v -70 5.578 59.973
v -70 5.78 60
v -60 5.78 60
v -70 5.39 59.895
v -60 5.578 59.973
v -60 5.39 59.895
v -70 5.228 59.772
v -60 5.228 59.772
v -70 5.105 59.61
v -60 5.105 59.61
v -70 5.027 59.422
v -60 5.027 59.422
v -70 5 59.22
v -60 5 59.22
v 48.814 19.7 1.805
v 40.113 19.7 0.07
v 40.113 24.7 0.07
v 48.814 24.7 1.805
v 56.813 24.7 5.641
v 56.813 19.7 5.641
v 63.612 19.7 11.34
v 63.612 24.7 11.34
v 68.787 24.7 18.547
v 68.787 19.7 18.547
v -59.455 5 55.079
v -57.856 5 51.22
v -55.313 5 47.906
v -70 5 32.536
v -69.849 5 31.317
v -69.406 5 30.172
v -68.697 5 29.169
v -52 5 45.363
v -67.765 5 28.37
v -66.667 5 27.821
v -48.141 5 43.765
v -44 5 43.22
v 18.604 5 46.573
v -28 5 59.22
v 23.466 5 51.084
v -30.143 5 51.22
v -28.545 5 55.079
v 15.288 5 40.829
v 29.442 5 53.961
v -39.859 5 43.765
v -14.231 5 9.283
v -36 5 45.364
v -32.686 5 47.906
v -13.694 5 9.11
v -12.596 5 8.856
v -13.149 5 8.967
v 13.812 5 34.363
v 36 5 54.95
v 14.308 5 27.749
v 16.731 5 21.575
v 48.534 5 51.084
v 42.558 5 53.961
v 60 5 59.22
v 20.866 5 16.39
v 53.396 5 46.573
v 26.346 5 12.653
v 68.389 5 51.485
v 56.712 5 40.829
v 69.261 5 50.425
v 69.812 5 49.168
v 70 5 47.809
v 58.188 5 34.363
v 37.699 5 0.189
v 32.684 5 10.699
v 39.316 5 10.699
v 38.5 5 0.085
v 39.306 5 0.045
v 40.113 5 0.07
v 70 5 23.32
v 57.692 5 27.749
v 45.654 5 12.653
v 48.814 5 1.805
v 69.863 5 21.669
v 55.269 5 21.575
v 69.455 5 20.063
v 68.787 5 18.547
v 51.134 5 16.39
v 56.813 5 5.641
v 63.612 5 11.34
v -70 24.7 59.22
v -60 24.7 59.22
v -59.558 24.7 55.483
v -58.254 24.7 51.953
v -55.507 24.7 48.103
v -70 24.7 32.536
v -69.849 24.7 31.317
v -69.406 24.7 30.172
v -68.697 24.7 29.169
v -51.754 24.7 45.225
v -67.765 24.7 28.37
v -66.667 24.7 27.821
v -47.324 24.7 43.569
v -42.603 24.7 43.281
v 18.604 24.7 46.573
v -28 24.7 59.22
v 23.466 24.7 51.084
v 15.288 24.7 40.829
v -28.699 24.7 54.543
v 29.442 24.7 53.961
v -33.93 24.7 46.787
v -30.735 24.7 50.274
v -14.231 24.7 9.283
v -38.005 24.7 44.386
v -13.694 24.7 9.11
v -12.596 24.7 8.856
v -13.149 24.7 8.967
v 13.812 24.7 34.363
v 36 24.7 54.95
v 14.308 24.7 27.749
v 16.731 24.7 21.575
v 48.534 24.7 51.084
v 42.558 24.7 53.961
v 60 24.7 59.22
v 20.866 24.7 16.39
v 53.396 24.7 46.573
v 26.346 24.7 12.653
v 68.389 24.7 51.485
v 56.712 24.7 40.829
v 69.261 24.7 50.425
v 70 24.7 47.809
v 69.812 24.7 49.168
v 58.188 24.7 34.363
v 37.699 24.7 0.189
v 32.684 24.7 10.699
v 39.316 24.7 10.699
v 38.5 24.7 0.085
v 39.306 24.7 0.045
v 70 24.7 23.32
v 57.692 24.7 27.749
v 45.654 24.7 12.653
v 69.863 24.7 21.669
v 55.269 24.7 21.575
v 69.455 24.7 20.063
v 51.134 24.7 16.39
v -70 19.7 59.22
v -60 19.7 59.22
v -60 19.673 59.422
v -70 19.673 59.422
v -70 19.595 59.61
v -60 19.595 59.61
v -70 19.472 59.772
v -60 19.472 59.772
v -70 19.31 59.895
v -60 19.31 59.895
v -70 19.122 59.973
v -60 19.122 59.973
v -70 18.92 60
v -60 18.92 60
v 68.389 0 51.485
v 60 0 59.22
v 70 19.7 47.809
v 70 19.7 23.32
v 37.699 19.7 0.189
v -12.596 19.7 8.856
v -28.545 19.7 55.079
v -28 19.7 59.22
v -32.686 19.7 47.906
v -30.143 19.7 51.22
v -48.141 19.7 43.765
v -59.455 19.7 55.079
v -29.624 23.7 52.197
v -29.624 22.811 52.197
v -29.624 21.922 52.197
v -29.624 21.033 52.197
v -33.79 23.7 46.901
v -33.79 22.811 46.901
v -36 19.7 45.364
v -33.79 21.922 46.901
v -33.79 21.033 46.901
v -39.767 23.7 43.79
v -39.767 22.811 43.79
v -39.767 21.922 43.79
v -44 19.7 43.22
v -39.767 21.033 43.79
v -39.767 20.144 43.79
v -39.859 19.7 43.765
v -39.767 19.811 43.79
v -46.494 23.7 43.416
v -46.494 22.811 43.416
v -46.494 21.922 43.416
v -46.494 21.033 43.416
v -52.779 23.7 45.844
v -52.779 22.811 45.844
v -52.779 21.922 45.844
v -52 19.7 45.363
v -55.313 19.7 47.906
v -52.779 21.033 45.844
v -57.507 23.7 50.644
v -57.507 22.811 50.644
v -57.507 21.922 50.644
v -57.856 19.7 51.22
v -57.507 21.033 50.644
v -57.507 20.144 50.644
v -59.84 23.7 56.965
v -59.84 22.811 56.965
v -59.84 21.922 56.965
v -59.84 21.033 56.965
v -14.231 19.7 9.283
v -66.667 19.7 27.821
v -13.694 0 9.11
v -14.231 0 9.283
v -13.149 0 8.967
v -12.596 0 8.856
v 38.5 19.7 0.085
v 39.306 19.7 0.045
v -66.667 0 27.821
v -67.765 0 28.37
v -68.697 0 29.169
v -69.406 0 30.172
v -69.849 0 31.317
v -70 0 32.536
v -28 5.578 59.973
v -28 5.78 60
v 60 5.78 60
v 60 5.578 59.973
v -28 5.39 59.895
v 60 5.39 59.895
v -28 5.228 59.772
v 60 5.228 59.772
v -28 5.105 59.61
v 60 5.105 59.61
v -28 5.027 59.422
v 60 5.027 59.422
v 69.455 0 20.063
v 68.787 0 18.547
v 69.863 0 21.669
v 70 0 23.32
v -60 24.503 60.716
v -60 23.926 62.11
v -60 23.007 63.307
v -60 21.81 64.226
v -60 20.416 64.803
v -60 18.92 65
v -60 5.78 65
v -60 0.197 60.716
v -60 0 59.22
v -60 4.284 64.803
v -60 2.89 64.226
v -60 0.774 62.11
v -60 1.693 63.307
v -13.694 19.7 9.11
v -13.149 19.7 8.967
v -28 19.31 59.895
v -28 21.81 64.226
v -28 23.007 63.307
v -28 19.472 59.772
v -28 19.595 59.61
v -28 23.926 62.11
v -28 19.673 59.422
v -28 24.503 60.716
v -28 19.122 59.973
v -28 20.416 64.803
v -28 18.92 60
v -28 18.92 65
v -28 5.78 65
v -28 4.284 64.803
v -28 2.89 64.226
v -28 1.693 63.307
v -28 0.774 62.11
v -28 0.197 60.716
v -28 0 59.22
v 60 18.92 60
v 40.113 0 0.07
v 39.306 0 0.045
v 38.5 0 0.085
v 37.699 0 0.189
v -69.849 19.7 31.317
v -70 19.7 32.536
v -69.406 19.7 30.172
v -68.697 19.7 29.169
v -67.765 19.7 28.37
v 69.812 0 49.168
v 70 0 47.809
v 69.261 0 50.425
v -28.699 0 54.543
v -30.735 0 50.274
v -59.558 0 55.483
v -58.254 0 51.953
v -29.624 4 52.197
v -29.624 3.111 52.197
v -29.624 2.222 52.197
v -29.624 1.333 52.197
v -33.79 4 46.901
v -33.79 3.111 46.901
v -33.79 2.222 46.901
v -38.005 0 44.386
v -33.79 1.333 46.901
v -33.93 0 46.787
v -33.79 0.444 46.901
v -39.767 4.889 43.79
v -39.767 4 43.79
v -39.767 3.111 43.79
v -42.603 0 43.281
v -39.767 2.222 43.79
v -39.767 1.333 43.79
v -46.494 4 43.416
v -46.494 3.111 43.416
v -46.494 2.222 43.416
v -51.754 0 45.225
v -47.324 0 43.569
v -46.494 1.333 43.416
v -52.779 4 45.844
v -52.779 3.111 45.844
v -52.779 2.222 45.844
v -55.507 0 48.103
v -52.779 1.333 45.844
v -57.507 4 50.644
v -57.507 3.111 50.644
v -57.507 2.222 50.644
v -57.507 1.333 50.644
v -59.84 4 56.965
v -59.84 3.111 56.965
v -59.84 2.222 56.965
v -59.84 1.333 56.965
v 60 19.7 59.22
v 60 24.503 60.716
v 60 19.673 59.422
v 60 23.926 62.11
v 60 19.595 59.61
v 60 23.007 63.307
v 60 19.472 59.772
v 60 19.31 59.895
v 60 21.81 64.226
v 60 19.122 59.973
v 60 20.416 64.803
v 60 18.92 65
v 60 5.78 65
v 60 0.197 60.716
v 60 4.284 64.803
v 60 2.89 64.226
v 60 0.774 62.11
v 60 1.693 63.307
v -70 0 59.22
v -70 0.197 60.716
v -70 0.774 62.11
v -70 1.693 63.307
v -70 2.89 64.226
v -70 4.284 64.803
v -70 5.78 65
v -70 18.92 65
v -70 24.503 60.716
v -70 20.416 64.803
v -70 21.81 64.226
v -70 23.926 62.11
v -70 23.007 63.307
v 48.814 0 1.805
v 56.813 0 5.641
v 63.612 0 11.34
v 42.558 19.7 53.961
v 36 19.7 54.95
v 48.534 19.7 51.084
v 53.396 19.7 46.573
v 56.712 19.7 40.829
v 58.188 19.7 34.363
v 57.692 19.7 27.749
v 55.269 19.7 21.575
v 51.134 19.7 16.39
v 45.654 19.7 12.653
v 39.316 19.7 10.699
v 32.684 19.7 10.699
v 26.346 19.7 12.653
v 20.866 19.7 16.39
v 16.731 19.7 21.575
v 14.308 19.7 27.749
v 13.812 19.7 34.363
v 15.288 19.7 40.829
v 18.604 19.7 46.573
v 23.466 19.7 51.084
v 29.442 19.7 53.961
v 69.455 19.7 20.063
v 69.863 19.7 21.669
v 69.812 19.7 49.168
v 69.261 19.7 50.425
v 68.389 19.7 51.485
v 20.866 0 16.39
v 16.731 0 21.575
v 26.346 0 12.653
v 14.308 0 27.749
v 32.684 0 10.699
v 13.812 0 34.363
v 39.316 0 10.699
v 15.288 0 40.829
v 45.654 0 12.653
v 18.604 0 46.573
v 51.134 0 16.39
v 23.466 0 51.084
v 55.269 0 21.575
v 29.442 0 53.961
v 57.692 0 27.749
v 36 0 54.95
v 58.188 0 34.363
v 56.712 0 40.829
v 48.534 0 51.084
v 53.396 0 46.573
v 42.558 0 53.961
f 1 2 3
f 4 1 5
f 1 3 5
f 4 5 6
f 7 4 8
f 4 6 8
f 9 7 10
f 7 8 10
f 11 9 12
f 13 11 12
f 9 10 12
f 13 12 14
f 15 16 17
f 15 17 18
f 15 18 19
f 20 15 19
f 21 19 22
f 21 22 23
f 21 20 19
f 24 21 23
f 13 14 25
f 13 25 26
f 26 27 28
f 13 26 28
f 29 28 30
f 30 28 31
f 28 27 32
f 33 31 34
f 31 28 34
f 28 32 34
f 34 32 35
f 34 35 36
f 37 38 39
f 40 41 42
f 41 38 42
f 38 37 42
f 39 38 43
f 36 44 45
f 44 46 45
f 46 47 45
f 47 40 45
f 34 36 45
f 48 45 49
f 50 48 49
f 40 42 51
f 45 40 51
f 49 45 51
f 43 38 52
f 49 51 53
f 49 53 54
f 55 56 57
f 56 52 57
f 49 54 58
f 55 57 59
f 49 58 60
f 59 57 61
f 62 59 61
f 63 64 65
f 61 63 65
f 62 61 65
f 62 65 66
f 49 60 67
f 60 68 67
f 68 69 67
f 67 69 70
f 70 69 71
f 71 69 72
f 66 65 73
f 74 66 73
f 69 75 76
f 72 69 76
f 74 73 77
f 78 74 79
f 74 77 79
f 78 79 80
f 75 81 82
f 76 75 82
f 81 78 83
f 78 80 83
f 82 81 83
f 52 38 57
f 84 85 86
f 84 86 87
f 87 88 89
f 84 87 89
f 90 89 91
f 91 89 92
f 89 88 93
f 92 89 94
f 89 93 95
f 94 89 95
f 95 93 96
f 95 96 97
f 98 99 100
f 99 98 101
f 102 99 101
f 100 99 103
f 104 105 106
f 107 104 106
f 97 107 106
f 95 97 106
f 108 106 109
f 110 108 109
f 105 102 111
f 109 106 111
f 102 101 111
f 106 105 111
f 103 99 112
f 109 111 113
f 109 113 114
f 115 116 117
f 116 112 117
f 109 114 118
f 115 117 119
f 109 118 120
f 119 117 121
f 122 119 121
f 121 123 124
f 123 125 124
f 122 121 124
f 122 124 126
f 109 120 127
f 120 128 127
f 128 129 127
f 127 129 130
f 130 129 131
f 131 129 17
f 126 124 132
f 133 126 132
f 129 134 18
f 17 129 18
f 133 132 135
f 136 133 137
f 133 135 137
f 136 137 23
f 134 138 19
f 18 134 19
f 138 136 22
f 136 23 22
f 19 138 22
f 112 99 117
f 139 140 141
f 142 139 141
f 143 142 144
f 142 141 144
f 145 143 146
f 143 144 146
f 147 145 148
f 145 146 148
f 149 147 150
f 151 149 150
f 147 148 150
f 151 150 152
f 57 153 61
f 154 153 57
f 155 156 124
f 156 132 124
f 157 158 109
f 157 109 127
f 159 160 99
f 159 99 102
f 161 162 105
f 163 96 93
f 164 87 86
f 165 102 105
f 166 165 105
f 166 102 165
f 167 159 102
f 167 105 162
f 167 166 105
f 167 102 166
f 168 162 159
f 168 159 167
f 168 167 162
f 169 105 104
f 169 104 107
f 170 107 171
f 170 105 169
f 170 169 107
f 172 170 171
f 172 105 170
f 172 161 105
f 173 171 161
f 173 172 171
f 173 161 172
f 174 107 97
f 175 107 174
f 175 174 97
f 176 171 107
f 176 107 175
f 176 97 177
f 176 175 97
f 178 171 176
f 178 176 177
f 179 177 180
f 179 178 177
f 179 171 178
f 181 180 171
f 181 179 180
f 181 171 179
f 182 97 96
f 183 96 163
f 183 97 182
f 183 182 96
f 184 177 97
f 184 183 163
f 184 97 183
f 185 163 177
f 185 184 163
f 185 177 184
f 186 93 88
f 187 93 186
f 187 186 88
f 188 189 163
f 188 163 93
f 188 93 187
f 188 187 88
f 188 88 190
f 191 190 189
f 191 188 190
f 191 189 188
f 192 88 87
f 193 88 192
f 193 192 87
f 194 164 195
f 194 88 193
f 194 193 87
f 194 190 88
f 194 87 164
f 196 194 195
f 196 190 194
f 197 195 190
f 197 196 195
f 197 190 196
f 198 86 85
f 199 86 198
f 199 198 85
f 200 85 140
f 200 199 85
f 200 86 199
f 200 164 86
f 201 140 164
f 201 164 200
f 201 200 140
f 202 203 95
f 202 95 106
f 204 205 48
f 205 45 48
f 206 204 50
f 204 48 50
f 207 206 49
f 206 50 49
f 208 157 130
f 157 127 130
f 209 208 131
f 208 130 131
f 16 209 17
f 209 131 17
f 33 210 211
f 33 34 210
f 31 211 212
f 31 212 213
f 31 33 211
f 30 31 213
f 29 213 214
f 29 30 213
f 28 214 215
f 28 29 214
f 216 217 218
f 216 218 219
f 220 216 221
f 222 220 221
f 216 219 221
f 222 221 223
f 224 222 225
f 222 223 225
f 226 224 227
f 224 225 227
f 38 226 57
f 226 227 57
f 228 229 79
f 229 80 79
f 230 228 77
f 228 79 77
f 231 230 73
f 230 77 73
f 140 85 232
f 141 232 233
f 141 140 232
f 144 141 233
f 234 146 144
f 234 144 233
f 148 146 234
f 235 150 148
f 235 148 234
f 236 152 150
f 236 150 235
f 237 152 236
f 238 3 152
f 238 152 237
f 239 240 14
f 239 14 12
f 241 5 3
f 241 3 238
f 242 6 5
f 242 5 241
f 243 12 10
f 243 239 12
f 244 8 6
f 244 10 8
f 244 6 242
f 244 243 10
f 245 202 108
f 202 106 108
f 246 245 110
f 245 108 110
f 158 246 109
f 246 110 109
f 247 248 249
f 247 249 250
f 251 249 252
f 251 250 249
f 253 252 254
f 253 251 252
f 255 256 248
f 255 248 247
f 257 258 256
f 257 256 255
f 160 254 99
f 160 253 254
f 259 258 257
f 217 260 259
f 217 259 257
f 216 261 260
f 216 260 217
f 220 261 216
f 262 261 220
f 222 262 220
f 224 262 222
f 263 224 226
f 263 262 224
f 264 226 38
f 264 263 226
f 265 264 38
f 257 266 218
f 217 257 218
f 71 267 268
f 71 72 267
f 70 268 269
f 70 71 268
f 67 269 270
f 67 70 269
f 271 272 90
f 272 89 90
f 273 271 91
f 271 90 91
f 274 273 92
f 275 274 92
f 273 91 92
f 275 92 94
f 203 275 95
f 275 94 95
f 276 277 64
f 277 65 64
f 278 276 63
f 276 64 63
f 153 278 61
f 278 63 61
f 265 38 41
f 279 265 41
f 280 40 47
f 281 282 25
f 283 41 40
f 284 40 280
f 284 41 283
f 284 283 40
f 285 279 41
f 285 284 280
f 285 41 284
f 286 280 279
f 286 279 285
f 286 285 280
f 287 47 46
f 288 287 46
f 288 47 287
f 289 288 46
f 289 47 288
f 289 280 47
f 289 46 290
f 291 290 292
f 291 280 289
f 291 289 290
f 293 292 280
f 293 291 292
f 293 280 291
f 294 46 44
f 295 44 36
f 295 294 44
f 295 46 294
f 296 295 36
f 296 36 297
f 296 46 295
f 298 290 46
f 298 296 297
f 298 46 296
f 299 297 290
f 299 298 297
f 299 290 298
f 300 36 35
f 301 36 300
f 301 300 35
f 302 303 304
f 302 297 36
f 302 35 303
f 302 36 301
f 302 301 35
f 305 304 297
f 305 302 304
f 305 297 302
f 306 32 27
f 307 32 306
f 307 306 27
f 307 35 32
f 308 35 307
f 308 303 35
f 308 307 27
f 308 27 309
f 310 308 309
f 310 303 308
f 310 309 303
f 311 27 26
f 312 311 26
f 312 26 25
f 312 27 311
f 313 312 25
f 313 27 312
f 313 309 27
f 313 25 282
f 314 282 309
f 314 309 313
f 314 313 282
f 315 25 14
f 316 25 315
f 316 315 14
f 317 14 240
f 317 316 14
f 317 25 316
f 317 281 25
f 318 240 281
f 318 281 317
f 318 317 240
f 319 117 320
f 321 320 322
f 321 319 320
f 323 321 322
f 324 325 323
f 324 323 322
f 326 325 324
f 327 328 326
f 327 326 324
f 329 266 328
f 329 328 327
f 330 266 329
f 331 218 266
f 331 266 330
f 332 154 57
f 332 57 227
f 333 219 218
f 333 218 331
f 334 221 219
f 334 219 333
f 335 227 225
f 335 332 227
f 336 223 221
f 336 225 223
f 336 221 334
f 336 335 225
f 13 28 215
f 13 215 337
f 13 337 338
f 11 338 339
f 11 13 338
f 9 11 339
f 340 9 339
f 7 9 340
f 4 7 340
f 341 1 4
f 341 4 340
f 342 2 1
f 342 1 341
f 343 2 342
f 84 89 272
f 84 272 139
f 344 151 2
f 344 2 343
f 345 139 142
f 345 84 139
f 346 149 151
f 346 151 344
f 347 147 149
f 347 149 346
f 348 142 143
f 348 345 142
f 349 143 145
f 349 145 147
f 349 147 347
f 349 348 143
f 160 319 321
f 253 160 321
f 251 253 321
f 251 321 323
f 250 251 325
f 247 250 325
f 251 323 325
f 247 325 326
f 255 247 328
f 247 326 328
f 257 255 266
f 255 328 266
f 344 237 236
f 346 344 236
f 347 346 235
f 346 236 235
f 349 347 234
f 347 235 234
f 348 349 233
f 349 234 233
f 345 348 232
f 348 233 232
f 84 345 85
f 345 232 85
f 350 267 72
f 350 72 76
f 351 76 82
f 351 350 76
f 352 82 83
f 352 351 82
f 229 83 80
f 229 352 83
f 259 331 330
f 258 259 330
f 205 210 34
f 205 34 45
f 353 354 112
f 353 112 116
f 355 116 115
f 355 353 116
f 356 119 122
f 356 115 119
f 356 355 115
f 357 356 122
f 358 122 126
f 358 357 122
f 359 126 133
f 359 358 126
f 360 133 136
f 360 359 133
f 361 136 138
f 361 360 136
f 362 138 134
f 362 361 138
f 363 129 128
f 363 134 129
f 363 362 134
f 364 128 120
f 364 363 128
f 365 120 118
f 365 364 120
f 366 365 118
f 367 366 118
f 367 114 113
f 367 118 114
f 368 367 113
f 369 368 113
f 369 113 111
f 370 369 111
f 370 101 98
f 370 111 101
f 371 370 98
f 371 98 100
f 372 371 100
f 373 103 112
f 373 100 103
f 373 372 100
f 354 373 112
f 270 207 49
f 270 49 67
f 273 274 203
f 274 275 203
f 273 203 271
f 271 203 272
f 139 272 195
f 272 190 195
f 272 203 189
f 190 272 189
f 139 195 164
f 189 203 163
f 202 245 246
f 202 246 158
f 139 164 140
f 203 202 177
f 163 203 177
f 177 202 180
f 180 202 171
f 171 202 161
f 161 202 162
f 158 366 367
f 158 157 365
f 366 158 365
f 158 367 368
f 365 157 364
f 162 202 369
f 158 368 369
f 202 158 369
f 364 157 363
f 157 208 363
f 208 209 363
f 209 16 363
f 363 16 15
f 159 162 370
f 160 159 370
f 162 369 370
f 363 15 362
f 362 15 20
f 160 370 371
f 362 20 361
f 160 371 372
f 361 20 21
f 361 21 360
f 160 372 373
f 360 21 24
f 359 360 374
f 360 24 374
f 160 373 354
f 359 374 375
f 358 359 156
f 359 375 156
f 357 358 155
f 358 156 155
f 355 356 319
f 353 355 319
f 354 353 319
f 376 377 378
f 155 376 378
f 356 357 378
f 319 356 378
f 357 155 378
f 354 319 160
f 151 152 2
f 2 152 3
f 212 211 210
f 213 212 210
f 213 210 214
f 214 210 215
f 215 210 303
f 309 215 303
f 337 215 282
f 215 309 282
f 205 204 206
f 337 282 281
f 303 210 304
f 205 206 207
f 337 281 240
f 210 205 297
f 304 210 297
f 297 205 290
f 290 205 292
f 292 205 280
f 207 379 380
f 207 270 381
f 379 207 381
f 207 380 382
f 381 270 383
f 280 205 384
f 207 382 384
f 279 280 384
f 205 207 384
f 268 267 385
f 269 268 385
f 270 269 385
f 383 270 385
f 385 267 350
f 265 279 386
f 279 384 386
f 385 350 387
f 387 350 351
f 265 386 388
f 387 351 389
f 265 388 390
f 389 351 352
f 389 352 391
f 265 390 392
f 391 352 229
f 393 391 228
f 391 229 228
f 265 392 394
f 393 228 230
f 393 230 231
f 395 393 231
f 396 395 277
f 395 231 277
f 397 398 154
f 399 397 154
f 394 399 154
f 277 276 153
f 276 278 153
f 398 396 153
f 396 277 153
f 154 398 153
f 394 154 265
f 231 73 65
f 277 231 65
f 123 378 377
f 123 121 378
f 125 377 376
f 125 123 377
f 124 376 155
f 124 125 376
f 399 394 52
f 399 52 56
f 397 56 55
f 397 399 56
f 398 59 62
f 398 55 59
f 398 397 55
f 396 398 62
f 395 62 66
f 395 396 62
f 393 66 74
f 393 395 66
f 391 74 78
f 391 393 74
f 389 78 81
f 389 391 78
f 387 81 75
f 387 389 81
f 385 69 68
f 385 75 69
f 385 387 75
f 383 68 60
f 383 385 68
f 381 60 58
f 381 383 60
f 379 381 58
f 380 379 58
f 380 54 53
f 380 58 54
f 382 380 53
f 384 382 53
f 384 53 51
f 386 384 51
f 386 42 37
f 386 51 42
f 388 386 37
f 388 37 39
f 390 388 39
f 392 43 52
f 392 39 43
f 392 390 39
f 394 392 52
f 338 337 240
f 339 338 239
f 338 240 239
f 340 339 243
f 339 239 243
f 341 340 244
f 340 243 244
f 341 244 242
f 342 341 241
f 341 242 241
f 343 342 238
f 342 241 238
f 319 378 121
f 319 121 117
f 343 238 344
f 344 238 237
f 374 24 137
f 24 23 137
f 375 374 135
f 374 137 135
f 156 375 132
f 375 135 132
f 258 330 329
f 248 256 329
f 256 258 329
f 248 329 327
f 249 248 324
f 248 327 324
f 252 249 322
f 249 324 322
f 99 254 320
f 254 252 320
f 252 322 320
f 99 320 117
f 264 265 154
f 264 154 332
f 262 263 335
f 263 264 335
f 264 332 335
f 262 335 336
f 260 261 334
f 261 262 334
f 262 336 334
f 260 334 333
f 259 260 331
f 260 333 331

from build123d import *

# Parameters (mm, degrees)
BASE_FLANGE1_DEPTH      = 70
CUT_EXTRUDE2_DEPTH      = 99.666559685
CUT_EXTRUDE2_DEPTH_BACK = 99.666559685
SKETCH6_R               = 22.25
CUT_EXTRUDE3_START      = -24.7
CUT_EXTRUDE3_DEPTH      = 24.7
FILLET1_R               = 10
FILLET2_R               = 5


# Read off the part's stored shape, not the designer's step: Cut-Extrude3
# Sheet-metal steps are written as plain solids
with BuildPart() as part:
    # Sketch1 → Base-Flange1 (new, symmetric)
    with BuildSketch(Plane(origin=(0, 0, 0), x_dir=(0, 0, -1), z_dir=(1, 0, 0))):
        with BuildLine():
            Line((0, 0), (-59.22, 0))
            ThreePointArc((-59.22, 0), (-63.307077195, 1.692922805), (-65, 5.78))
            Line((-65, 5.78), (-65, 18.92))
            ThreePointArc((-65, 18.92), (-63.307077195, 23.007077195), (-59.22, 24.7))
            Line((-59.22, 24.7), (0, 24.7))
            Line((0, 24.7), (0, 19.7))
            Line((0, 19.7), (-59.22, 19.7))
            ThreePointArc((-59.22, 19.7), (-59.771543289, 19.471543289), (-60, 18.92))
            Line((-60, 18.92), (-60, 5.78))
            ThreePointArc((-60, 5.78), (-59.771543289, 5.228456711), (-59.22, 5))
            Line((-59.22, 5), (0, 5))
            Line((0, 5), (0, 0))
        make_face()
    extrude(amount=BASE_FLANGE1_DEPTH, both=True)

    # Sketch6 → Cut-Extrude2 (cut, two sides: drawn at the far end of the back side and taken through both)
    with BuildSketch(Plane(origin=(0, 0, 0), x_dir=(1, 0, 0), z_dir=(0, 1, 0)).offset(-CUT_EXTRUDE2_DEPTH_BACK)):
        with Locations(Location((36, -32.7, 0), (0, 0, 270))):
            Circle(SKETCH6_R)
    extrude(amount=CUT_EXTRUDE2_DEPTH + CUT_EXTRUDE2_DEPTH_BACK, mode=Mode.SUBTRACT)

    # Cut-Extrude3 outline → Cut-Extrude3 (cut)
    with BuildSketch(Plane(origin=(0, 24.7, 0), x_dir=(1, 0, 0), z_dir=(0, 1, 0)).offset(CUT_EXTRUDE3_START)):
        with BuildLine():
            add(Edge.make_bspline(
                [(-28, -59.22), (-28.001483373, -59.059147185), (-28.006444043, -58.521225961), (-28.068654058, -57.607370733), (-28.221663959, -56.485748427), (-28.454487396, -55.377760999), (-28.76476049, -54.288987367), (-29.151253932, -53.224858787), (-29.611949694, -52.190697164), (-30.144568106, -51.191670906), (-30.746440721, -50.232773794), (-31.414560774, -49.318798758), (-32.145588265, -48.454314261), (-32.935869316, -47.643641371), (-33.781453727, -46.890832185), (-34.678114904, -46.199649575), (-35.621370941, -45.573548372), (-36.606507032, -45.015658105), (-37.628599035, -44.528767354), (-38.682538088, -44.11530981), (-39.763056142, -43.777352116), (-40.864752295, -43.516583532), (-41.982119787, -43.334307495), (-43.109573528, -43.231435098), (-44.24147801, -43.208480544), (-45.372175479, -43.265558569), (-46.496014214, -43.402383872), (-47.607376779, -43.618272541), (-48.700708096, -43.91214547), (-49.770543218, -44.282533752), (-50.81153464, -44.727586026), (-51.818479031, -45.245077726), (-52.786343244, -45.832422201), (-53.71028947, -46.486683647), (-54.585699418, -47.204591779), (-55.408197421, -47.982558178), (-56.17367222, -48.816694228), (-56.878297832, -49.702830551), (-57.518551508, -50.636537851), (-58.091235675, -51.613149051), (-58.593477749, -52.627782619), (-59.022804836, -53.675366973), (-59.376930909, -54.75066583), (-59.654608607, -55.848304374), (-59.852499172, -56.962796127), (-59.976893957, -58.088570374), (-59.992297986, -58.842856791), (-60, -59.22)],
                knots=[0, 0, 0, 0, 0.009602085, 0.032111129, 0.054620172, 0.077129216, 0.099638259, 0.122147303, 0.144656346, 0.16716539, 0.189674433, 0.212183477, 0.23469252, 0.257201564, 0.279710607, 0.302219651, 0.324728695, 0.347237738, 0.369746782, 0.392255825, 0.414764869, 0.437273912, 0.459782956, 0.482291999, 0.504801043, 0.527310086, 0.54981913, 0.572328173, 0.594837217, 0.61734626, 0.639855304, 0.662364347, 0.684873391, 0.707382434, 0.729891478, 0.752400521, 0.774909565, 0.797418608, 0.819927652, 0.842436695, 0.864945739, 0.887454782, 0.909963826, 0.932472869, 0.954981913, 0.977490956, 1, 1, 1, 1], degree=3))
            Line((-60, -59.22), (-60, -65))
            Line((-60, -65), (-28, -65))
            Line((-28, -65), (-28, -59.22))
        make_face()
        Polygon((-13.431457505, -9), (38.798801924, 0), (-70, 0), (-70, -29), align=None)
        with BuildLine():
            ThreePointArc((38.798801924, 0), (57.406545367, -6.032071037), (70, -21))
            Line((70, -21), (70, 0))
            Line((70, 0), (38.798801924, 0))
        make_face()
        Polygon((70, -65), (70, -50), (60, -59.22), (60, -65), align=None)
    extrude(amount=CUT_EXTRUDE3_DEPTH, mode=Mode.SUBTRACT)

    # Fillet1
    fillet1_edges = [part.edges().sort_by_distance(p)[0] for p in [
        (38.798801924, 22.2, 0),
        (-13.431457505, 22.2, 9),
        (70, 2.5, 21),
        (38.798801924, 2.5, 0),
        (-13.431457505, 2.5, 9),
        (70, 22.2, 21),
    ]]
    fillet(fillet1_edges, radius=FILLET1_R)

    # Fillet2
    fillet2_edges = [part.edges().sort_by_distance(p)[0] for p in [
        (-70, 22.2, 29),
        (70, 2.5, 50),
        (70, 22.2, 50),
        (-70, 2.5, 29),
    ]]
    fillet(fillet2_edges, radius=FILLET2_R)


solid = part.part
